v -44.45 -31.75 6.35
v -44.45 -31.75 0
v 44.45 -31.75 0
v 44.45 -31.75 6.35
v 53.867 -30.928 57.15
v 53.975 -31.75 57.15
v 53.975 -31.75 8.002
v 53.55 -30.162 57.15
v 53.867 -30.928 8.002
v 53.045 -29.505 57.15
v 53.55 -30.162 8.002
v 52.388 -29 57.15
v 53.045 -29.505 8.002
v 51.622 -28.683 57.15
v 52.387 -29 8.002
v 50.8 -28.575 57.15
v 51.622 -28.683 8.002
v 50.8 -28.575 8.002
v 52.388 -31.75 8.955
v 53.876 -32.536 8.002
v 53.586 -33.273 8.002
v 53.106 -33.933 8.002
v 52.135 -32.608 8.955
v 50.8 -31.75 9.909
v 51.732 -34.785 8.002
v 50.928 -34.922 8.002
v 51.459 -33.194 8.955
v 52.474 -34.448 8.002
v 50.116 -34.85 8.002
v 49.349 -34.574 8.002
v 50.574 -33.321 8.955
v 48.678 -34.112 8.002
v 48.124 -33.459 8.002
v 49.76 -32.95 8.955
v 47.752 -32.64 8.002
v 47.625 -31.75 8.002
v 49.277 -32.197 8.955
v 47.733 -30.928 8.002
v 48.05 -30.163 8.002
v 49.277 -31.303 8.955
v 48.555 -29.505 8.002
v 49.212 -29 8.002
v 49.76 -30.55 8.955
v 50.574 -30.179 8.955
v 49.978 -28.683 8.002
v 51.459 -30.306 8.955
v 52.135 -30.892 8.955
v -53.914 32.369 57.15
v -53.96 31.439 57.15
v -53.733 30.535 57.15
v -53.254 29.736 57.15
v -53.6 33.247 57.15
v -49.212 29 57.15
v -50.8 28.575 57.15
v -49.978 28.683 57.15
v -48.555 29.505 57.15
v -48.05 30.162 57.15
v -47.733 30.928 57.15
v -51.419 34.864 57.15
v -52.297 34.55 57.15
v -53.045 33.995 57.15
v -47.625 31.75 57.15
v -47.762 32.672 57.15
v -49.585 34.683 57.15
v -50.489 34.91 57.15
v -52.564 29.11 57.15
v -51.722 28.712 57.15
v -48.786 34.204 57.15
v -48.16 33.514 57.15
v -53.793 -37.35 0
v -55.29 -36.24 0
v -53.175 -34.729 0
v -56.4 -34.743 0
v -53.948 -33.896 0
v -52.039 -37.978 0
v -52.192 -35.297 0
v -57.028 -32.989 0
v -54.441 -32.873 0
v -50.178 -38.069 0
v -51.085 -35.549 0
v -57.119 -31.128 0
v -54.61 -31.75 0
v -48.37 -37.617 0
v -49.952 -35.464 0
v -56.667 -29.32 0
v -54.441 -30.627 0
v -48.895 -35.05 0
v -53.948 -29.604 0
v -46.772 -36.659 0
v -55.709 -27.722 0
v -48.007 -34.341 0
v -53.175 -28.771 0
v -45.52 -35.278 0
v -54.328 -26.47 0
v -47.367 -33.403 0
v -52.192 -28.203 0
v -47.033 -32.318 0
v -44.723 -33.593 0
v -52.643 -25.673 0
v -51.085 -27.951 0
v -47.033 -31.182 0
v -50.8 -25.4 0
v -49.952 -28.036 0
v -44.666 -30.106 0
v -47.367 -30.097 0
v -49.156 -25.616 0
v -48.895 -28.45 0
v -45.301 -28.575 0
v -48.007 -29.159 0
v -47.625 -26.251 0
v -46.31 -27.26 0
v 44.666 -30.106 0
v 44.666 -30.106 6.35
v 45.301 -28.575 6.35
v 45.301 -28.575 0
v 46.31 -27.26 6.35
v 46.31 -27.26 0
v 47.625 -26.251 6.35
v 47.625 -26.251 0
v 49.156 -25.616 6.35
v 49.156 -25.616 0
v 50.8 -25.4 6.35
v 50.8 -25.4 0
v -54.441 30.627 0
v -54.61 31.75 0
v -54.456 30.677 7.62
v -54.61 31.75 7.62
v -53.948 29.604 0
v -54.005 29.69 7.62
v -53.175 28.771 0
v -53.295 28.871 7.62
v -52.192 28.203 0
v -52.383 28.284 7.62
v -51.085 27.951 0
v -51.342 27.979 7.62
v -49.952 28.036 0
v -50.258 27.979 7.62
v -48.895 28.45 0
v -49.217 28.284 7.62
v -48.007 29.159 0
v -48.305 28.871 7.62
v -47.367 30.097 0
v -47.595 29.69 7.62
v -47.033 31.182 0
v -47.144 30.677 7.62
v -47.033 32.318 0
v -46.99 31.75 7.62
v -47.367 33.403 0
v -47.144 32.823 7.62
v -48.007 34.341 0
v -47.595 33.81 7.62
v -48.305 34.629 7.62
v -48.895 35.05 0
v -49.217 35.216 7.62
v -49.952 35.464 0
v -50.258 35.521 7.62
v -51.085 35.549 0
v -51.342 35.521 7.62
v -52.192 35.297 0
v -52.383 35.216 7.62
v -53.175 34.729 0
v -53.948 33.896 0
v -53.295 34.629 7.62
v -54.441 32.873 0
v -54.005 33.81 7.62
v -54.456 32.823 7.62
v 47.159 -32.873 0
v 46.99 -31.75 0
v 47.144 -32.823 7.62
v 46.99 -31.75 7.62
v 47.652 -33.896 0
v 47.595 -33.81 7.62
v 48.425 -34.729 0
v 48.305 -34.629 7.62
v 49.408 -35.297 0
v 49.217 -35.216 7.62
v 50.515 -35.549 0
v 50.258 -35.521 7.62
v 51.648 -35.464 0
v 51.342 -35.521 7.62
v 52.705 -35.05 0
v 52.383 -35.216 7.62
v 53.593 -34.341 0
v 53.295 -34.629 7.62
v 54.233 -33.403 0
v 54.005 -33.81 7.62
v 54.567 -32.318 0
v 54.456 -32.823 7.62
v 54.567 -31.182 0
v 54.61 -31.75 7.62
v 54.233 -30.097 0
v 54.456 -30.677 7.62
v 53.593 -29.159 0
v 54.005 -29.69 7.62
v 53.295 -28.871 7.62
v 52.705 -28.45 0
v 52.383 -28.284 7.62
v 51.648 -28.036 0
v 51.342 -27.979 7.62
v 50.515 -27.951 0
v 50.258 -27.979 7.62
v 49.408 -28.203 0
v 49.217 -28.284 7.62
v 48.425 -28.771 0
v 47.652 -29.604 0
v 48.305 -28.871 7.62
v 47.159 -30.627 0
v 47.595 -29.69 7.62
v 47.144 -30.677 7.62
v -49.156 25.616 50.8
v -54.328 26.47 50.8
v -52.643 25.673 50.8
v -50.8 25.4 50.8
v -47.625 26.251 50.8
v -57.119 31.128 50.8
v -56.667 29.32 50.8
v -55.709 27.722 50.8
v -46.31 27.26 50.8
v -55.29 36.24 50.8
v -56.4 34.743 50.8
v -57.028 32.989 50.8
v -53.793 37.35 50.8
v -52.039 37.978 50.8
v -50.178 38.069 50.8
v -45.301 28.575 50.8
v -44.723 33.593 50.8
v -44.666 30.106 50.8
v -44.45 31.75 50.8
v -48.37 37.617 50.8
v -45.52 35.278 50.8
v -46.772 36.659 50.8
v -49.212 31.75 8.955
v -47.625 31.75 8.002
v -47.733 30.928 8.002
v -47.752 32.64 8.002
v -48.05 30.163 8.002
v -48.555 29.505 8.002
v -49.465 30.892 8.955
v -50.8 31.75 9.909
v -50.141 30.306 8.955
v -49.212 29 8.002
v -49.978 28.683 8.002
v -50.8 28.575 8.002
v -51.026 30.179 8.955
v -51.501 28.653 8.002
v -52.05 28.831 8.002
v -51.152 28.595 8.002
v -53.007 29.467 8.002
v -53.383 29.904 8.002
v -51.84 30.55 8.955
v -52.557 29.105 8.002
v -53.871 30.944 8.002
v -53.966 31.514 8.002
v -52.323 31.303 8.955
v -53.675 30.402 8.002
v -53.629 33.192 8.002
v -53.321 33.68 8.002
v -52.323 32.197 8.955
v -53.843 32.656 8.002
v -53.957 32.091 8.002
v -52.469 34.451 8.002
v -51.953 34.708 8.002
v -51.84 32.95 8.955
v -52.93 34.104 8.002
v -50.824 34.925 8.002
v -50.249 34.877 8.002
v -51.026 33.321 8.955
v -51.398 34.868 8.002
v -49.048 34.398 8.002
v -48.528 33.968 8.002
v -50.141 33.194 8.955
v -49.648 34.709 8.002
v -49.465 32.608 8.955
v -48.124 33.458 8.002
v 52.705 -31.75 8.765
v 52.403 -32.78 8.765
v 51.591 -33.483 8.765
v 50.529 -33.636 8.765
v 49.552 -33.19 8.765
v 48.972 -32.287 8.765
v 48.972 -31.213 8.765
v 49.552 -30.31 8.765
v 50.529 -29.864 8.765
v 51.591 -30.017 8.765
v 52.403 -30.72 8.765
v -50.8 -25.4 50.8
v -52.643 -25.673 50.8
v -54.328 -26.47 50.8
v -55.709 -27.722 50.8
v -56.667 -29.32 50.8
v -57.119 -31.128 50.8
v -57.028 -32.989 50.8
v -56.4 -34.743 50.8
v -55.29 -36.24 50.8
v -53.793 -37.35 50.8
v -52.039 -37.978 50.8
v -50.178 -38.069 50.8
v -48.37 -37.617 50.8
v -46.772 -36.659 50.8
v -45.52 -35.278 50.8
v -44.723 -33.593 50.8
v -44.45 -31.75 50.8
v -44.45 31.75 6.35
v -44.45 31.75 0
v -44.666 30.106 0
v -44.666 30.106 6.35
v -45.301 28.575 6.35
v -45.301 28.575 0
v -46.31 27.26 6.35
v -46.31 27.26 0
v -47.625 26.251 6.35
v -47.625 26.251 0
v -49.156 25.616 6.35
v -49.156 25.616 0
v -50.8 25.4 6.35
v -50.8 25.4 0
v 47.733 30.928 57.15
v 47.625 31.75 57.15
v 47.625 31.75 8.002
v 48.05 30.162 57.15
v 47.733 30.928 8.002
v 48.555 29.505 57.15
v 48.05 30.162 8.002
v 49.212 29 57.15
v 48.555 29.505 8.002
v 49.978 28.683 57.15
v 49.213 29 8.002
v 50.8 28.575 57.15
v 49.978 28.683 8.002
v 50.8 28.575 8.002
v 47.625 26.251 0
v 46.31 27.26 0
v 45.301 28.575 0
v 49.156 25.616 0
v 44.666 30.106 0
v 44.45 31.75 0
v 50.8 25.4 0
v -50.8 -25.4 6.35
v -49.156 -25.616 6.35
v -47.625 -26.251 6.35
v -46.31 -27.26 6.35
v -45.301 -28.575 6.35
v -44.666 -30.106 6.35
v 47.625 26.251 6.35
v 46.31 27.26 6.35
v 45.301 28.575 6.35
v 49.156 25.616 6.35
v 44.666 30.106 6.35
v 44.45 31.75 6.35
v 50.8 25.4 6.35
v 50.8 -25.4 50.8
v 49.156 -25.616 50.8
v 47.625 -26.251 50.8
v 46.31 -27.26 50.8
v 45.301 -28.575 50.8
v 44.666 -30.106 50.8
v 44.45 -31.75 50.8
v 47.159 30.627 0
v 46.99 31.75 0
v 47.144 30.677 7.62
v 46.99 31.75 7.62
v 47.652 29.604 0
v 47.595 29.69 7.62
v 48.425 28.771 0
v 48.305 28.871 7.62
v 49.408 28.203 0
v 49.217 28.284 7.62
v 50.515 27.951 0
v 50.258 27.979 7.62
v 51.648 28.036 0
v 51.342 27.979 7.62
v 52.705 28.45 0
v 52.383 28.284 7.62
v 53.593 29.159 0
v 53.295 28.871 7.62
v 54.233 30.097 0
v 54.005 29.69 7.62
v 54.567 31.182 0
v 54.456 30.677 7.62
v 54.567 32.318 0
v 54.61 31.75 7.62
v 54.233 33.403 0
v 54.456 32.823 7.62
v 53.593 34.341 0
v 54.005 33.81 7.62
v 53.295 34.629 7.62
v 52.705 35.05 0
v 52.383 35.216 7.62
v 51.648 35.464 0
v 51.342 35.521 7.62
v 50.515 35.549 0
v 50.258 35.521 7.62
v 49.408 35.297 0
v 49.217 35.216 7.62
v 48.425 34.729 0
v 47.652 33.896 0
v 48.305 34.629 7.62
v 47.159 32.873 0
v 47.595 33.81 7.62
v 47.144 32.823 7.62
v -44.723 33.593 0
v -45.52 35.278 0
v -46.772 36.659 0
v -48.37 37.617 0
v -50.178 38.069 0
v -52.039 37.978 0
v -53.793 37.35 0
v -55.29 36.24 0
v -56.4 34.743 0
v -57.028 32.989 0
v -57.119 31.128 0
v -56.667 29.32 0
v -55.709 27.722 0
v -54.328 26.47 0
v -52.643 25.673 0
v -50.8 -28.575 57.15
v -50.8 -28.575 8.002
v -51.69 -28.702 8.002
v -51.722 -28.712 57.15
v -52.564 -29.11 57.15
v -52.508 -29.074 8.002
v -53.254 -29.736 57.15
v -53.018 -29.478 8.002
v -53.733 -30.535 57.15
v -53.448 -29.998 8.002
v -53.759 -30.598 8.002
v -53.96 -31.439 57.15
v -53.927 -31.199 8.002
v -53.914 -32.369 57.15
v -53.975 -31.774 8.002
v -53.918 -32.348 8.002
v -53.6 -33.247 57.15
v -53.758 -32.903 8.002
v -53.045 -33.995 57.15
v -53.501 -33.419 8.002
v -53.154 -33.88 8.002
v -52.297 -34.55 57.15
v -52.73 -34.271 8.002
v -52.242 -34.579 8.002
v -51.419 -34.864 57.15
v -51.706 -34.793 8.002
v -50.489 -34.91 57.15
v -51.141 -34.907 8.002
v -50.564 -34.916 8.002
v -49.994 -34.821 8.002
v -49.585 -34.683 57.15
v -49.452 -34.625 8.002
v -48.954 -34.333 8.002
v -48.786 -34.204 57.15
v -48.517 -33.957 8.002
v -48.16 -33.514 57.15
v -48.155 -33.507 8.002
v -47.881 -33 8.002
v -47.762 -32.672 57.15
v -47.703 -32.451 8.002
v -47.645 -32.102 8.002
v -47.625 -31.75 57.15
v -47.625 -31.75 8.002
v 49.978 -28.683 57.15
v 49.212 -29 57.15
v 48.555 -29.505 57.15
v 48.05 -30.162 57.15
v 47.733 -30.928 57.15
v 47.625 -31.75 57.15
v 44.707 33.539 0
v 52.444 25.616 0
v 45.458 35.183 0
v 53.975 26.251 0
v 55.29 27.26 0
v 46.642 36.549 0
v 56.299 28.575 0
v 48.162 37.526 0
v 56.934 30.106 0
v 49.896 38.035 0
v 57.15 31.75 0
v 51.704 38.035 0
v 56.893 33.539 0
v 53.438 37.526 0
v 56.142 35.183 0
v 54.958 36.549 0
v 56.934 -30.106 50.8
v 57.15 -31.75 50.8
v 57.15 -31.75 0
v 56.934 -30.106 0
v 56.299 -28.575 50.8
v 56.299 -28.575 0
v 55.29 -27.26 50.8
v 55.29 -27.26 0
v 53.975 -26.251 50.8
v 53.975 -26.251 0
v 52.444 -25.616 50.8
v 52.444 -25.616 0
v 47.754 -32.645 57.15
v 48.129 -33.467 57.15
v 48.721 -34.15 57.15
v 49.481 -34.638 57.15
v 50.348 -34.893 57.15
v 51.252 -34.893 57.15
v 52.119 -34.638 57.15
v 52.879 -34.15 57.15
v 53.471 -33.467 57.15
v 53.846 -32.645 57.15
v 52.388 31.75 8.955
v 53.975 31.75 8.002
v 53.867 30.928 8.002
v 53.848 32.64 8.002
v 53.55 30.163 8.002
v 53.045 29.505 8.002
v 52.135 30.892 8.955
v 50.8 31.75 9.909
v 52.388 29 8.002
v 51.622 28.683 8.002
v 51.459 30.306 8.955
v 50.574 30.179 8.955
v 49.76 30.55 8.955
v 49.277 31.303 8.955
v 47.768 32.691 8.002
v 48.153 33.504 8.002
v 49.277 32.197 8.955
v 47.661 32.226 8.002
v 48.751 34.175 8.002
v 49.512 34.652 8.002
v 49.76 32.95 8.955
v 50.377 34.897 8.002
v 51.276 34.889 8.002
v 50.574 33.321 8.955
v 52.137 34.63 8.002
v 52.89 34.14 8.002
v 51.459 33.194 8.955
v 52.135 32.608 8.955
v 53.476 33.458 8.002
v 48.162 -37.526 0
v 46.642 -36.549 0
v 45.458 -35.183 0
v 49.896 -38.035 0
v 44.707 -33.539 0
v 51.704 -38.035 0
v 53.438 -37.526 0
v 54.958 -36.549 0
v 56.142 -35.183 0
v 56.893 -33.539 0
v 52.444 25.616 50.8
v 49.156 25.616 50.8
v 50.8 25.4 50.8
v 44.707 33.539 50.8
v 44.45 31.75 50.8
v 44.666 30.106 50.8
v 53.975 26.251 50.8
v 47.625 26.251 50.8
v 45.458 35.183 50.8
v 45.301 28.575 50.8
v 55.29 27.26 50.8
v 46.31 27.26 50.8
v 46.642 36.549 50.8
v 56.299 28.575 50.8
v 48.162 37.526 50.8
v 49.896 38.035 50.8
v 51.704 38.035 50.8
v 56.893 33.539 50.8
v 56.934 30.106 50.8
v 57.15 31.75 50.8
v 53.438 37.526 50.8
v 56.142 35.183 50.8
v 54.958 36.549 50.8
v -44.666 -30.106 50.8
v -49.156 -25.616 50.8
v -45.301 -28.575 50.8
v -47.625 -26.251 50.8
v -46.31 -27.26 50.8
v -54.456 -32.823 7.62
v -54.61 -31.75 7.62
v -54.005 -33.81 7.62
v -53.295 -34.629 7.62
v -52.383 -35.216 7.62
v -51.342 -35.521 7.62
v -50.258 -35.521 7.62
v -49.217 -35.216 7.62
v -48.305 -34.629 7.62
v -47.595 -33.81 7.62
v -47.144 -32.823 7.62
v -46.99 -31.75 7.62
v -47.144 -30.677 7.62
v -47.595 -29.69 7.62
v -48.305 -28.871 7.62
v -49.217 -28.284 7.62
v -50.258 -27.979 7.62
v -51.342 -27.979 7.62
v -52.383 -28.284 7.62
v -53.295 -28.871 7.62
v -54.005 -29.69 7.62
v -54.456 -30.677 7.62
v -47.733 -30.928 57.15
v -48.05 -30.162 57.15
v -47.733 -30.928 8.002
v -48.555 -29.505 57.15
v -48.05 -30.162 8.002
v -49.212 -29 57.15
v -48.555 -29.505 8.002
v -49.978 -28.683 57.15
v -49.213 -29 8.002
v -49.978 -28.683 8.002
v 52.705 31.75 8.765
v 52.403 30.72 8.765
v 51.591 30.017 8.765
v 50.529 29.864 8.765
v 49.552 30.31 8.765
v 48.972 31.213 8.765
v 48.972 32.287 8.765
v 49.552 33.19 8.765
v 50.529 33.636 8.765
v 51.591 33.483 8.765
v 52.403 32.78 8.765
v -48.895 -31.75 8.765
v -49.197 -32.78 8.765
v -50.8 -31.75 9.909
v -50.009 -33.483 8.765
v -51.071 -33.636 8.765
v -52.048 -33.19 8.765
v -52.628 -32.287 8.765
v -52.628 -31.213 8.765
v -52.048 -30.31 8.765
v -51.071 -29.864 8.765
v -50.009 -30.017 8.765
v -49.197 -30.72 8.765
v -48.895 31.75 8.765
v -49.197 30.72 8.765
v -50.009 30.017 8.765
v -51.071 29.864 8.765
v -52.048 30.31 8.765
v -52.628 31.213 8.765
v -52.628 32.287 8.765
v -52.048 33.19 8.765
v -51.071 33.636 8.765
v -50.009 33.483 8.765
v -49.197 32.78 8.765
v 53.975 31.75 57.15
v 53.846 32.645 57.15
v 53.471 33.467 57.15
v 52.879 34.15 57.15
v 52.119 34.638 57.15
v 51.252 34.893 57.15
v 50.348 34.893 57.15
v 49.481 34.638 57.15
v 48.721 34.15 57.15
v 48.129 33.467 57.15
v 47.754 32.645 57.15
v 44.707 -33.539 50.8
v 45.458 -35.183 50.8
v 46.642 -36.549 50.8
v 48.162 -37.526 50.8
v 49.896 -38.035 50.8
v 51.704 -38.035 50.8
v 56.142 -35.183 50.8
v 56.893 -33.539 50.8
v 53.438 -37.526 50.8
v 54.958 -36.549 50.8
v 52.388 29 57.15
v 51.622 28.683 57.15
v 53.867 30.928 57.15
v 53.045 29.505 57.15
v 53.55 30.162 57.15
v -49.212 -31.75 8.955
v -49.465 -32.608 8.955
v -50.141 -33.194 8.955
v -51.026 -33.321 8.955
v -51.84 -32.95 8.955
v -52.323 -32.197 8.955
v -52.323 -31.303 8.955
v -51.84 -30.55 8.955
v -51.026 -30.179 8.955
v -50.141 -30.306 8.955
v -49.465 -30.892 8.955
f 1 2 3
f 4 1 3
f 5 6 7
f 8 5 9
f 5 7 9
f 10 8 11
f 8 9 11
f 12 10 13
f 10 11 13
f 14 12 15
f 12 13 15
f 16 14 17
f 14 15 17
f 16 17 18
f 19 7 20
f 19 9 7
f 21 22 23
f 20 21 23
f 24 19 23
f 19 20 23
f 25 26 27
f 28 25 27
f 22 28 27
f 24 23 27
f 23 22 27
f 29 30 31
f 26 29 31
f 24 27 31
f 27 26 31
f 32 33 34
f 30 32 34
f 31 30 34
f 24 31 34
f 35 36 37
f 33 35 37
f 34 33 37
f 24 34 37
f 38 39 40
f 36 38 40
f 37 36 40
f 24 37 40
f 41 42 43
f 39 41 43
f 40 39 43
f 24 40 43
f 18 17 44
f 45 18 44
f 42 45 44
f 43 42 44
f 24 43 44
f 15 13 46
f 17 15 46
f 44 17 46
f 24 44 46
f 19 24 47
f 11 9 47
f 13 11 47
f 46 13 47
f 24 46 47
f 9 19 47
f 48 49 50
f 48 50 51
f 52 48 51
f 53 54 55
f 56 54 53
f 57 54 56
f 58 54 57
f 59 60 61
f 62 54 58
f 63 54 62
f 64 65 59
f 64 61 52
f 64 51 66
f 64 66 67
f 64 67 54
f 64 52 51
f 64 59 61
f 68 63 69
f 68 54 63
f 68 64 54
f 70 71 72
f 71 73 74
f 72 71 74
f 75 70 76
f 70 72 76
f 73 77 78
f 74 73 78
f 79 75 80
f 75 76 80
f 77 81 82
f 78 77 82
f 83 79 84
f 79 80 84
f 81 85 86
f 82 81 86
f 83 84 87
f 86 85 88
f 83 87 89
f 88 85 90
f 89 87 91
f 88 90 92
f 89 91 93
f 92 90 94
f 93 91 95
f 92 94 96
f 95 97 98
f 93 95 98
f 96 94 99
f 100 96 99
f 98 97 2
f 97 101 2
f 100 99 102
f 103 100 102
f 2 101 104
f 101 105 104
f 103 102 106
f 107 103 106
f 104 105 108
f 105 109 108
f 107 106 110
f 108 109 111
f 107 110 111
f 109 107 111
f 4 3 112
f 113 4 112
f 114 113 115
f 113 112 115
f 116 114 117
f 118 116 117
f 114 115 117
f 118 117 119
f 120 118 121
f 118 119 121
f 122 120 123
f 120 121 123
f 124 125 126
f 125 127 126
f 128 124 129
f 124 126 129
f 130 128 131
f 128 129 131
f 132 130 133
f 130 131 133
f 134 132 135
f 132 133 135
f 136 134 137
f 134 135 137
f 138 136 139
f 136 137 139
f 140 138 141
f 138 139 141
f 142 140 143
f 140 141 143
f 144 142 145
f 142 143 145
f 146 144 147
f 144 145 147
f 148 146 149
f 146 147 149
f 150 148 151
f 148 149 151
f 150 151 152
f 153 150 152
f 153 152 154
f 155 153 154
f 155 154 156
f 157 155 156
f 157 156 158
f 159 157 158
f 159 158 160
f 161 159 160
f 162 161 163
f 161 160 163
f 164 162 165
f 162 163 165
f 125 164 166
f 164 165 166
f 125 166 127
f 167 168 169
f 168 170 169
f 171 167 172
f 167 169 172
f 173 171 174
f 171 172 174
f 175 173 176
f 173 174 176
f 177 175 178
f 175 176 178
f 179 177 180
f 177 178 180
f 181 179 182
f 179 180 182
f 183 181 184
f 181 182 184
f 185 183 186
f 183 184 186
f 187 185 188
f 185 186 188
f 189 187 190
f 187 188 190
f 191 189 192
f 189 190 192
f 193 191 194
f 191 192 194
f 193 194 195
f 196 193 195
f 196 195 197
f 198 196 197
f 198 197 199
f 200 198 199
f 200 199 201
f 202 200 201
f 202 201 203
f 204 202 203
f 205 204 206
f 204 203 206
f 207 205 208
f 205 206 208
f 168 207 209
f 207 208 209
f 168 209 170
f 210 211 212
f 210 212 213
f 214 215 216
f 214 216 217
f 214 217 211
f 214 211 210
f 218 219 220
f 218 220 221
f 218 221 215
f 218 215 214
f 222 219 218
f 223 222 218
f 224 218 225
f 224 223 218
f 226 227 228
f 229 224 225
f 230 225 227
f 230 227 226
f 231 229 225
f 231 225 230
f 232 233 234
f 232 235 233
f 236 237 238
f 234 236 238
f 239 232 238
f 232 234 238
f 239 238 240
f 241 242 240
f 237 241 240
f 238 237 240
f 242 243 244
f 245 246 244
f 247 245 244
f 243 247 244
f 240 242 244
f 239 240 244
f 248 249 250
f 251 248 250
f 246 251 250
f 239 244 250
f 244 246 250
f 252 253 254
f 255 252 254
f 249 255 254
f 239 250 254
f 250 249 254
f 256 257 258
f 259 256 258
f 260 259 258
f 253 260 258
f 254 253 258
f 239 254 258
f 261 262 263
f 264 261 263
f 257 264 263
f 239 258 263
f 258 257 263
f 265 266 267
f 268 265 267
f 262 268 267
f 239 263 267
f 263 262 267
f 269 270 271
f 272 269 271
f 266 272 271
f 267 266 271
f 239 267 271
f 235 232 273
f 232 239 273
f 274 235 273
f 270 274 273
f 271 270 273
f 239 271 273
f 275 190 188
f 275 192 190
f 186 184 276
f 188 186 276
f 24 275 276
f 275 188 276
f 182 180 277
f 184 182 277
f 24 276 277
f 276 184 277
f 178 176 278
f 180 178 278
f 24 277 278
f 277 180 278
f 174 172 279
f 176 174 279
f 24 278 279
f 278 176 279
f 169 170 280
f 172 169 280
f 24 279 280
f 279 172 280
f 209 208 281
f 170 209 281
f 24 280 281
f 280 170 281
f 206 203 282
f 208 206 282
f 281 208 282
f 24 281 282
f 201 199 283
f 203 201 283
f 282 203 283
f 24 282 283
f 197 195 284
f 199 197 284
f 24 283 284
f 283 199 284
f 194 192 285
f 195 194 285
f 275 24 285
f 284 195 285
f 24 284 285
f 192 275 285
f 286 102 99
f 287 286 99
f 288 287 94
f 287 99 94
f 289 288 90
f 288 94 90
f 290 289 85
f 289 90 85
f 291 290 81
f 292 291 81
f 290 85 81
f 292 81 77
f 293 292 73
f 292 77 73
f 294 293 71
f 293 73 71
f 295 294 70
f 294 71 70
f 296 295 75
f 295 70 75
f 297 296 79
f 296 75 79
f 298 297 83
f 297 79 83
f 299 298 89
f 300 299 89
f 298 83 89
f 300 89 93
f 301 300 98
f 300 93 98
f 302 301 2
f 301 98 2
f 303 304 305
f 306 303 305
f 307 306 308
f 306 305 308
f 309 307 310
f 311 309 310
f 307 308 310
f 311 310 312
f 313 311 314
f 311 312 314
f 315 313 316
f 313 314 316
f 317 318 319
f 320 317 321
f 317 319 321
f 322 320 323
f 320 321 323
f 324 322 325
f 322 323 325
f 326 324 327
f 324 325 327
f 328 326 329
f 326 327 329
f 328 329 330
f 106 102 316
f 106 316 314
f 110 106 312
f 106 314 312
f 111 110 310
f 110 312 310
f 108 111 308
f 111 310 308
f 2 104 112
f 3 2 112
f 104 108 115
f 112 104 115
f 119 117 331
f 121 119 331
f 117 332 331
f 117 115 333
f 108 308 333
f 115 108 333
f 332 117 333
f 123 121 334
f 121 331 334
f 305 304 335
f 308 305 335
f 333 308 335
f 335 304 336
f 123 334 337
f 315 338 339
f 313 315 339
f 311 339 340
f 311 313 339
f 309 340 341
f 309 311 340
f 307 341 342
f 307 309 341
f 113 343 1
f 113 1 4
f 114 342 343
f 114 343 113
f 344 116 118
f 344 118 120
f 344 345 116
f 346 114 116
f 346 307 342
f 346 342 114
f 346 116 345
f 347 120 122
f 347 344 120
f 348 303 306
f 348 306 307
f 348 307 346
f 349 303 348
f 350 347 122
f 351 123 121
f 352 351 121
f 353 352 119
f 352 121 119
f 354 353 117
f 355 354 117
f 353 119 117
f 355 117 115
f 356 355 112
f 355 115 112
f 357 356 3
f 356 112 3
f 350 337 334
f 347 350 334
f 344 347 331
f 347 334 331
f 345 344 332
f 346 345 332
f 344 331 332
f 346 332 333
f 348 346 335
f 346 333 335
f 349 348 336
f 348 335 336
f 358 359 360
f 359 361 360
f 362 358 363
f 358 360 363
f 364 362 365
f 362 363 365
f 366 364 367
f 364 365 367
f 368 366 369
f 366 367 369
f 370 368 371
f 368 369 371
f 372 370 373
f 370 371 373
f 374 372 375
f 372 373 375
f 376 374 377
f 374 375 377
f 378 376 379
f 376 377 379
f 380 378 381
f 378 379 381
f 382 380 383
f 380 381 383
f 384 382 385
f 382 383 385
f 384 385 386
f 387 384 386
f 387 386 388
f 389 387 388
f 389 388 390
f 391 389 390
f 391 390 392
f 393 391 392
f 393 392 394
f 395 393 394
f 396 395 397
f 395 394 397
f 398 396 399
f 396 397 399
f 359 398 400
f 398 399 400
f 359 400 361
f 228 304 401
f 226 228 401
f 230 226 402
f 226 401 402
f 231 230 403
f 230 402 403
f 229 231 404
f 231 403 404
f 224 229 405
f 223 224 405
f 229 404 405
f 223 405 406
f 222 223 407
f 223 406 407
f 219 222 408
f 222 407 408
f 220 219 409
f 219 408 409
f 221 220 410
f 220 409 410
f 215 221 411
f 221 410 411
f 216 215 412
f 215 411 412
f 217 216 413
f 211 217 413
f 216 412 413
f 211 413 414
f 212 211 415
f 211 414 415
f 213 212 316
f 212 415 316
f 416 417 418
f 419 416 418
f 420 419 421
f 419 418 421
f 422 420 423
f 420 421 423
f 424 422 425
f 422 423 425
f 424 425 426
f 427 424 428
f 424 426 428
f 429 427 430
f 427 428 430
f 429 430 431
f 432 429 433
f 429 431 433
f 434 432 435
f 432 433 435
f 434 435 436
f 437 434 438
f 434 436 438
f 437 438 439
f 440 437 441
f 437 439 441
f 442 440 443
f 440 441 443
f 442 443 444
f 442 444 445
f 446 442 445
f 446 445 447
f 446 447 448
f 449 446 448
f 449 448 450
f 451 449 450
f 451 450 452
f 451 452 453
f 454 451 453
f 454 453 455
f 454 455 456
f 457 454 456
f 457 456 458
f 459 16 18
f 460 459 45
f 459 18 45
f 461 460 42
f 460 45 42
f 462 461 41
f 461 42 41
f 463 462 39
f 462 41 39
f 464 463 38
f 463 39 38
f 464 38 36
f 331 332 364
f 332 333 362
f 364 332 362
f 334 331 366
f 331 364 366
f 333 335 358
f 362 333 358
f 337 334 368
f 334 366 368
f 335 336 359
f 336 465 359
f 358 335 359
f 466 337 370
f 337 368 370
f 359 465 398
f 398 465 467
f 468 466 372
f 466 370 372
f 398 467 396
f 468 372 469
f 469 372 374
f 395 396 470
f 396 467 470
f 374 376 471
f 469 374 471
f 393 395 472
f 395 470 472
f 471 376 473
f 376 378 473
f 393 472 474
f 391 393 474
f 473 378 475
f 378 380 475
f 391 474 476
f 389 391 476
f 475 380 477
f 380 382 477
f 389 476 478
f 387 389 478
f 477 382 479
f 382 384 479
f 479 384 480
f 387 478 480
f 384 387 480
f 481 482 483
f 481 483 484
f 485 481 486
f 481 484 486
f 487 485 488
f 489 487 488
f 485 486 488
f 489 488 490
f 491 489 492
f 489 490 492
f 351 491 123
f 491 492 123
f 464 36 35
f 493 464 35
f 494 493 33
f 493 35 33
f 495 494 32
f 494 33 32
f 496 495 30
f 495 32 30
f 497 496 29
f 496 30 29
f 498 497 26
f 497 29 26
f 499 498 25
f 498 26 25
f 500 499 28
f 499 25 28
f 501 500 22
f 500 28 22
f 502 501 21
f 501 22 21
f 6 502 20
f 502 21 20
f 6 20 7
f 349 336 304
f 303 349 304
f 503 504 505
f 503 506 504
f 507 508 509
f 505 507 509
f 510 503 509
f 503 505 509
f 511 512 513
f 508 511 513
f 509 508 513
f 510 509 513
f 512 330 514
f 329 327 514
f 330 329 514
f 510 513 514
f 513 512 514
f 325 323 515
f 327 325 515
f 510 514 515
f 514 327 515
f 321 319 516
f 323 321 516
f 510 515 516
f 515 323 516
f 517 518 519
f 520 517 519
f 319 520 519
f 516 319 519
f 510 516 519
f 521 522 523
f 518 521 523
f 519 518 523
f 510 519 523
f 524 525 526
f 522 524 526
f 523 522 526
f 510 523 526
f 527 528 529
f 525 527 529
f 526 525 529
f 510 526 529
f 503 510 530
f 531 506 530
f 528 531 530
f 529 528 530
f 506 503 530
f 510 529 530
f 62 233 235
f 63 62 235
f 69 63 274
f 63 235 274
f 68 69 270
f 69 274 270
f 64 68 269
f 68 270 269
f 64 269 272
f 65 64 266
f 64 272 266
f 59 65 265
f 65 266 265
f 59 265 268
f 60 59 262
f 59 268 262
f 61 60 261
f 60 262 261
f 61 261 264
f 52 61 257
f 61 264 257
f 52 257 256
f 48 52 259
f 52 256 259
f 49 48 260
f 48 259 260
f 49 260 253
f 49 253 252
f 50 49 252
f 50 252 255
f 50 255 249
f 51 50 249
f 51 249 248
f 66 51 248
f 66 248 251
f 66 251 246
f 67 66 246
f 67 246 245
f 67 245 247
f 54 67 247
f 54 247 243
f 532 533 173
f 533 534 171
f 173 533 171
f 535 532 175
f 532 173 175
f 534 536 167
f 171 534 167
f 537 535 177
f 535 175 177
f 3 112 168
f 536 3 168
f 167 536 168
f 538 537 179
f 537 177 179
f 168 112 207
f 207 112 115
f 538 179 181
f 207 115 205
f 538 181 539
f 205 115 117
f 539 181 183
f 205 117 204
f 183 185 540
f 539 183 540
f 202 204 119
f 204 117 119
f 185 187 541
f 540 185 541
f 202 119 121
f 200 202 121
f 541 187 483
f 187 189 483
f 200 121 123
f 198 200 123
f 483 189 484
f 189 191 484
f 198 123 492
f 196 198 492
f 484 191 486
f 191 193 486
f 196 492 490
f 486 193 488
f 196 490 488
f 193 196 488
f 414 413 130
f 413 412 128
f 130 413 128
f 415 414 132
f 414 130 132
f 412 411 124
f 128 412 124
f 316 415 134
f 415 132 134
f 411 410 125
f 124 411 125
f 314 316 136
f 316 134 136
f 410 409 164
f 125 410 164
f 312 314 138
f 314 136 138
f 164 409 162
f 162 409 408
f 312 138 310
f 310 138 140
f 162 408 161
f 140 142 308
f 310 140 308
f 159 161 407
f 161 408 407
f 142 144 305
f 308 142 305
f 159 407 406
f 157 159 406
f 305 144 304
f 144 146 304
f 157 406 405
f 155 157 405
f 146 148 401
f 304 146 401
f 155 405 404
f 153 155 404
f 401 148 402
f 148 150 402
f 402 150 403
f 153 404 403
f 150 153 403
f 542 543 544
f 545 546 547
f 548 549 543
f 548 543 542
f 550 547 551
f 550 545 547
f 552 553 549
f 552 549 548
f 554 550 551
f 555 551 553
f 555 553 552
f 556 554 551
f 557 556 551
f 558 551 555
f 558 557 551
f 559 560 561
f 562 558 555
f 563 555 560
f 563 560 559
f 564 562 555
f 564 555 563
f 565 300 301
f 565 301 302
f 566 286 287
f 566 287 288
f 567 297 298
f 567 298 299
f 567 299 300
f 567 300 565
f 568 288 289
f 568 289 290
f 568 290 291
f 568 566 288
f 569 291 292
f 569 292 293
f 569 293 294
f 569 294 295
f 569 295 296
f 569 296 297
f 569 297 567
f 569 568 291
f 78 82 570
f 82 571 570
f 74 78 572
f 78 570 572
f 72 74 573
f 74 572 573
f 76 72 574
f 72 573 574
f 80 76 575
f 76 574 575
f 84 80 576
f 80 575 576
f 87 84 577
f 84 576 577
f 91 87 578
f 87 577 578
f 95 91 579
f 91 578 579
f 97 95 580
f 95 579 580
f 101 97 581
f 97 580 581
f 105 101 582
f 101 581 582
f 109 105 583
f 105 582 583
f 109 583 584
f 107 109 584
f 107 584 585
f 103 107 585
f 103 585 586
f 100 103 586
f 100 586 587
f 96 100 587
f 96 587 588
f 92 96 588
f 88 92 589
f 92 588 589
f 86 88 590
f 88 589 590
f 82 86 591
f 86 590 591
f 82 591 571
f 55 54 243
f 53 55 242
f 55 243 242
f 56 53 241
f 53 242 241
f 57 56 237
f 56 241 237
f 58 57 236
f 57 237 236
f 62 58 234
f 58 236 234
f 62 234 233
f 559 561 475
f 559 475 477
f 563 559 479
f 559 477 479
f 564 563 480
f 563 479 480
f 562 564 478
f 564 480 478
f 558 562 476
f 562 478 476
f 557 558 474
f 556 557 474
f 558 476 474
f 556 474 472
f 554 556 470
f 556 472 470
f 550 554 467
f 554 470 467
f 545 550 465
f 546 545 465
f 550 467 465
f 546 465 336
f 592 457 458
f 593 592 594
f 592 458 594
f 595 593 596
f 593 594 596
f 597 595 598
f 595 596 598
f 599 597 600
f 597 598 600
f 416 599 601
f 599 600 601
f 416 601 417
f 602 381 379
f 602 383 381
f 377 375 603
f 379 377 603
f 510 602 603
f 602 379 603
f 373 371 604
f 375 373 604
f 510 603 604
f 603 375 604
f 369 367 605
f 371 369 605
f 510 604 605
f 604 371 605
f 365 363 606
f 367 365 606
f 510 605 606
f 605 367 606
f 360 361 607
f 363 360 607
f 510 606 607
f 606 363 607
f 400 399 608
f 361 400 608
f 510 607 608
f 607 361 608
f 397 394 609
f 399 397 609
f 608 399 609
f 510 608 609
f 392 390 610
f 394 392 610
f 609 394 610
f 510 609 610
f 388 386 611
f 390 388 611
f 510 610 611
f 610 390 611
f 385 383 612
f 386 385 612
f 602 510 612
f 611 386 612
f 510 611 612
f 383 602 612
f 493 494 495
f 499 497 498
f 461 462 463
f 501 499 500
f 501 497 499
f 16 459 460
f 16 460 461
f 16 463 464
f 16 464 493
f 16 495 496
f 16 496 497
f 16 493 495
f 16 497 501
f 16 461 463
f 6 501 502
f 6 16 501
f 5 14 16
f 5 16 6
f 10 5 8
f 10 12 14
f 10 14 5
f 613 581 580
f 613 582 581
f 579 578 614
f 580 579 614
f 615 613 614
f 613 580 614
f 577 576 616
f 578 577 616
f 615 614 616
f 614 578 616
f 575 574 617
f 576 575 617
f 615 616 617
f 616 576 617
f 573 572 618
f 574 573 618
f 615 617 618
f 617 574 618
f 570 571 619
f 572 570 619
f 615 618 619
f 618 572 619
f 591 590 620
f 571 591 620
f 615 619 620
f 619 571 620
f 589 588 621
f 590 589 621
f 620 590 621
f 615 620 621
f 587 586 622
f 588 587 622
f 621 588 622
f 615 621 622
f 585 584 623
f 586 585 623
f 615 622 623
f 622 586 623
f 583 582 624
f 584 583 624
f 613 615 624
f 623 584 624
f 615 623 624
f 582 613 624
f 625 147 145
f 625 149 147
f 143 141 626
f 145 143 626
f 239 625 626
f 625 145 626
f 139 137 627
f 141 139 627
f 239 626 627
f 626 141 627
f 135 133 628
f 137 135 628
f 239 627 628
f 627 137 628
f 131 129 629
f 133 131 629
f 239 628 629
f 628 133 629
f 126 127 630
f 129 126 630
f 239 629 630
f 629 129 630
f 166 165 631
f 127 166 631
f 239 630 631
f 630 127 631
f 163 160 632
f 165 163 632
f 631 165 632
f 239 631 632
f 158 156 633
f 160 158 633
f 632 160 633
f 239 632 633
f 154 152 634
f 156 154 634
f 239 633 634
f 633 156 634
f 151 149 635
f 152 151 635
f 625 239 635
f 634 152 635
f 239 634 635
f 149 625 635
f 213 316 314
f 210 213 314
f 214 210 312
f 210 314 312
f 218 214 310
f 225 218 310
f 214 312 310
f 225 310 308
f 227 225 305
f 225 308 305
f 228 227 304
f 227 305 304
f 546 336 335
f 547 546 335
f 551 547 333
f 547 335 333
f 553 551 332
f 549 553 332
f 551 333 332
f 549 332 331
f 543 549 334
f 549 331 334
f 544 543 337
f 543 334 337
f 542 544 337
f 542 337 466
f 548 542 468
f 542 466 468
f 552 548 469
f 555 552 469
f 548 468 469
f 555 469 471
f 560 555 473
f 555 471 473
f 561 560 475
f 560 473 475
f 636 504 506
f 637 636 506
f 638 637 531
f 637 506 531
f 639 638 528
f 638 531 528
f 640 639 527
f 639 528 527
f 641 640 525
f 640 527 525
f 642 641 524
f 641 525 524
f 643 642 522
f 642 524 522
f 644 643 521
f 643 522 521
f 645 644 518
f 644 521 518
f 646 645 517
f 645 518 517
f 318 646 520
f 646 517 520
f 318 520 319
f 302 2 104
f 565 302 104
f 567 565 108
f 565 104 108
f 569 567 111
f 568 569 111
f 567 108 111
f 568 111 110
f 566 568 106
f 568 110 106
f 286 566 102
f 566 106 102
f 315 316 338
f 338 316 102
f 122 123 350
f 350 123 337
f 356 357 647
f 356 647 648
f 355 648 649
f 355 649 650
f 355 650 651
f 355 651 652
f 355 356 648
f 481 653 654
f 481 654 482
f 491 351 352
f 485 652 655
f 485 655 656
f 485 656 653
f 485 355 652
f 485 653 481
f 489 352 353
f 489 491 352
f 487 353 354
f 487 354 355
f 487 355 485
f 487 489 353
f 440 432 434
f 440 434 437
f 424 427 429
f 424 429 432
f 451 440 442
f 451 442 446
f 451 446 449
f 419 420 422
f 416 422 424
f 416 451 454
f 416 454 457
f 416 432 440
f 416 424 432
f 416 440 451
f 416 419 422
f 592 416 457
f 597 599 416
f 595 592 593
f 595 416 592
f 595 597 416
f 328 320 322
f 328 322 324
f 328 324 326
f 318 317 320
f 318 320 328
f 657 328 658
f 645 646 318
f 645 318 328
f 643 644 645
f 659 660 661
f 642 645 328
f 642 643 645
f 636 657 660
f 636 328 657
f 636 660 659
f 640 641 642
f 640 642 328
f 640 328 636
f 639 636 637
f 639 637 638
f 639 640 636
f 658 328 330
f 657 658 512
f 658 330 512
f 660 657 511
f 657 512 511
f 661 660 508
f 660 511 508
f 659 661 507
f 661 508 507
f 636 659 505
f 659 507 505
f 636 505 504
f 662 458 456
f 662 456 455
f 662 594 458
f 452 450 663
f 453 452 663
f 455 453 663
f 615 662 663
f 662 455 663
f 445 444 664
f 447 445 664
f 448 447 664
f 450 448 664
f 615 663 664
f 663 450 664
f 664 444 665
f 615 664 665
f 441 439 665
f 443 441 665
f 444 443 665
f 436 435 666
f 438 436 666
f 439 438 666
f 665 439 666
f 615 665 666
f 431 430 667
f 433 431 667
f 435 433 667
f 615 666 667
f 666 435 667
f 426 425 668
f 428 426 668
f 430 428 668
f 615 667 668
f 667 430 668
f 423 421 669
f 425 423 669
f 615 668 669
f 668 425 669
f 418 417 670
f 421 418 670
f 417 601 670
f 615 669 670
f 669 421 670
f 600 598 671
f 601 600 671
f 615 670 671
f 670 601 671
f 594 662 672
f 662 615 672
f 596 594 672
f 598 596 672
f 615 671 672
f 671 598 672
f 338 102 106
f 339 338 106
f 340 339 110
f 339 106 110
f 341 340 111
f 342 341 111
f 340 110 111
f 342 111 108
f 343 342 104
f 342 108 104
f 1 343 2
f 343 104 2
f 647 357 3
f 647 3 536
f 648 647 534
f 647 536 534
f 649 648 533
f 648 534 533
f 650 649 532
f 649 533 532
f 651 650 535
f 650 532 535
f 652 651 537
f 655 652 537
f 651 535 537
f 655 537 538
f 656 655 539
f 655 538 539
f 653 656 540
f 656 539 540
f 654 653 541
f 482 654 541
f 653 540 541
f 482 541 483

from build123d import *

# Parameters (mm, degrees)
F1_DEPTH   = 50.8
F2_DEPTH   = 6.35
F3_DEPTH   = 57.15
F4_D       = 7.62
F4_DEPTH   = 7.62
F4_TIP     = 2.2892789585
F4_2_D     = 7.62
F4_2_DEPTH = 7.62
F4_2_TIP   = 2.2892789585
F4_3_D     = 7.62
F4_3_DEPTH = 7.62
F4_3_TIP   = 2.2892789585
F4_4_D     = 7.62
F4_4_DEPTH = 7.62
F4_4_TIP   = 2.2892789585
F4_5_D     = 7.62
F4_5_DEPTH = 7.62
F4_5_TIP   = 2.2892789585
F4_6_D     = 7.62
F4_6_DEPTH = 7.62
F4_6_TIP   = 2.2892789585
F4_7_D     = 7.62
F4_7_DEPTH = 7.62
F4_7_TIP   = 2.2892789585
F4_8_D     = 7.62
F4_8_DEPTH = 7.62
F4_8_TIP   = 2.2892789585


with BuildPart() as f1:
    # F0 (on Top) → F1 (new body)
    with BuildSketch(Plane.XY):
        with BuildLine():
            Line((-47.625, 31.75), (-44.45, 31.75))
            ThreePointArc((-44.45, 31.75), (-55.2901280605, 36.2401280605), (-50.8, 25.4))
            Line((-50.8, 25.4), (-50.8, 28.575))
            ThreePointArc((-50.8, 28.575), (-53.0450640303, 33.9950640303), (-47.625, 31.75))
        make_face()
        with BuildLine():
            Line((-50.8, 31.75), (-47.625, 31.75))
            ThreePointArc((-47.625, 31.75), (-53.0450640303, 33.9950640303), (-50.8, 28.575))
            Line((-50.8, 28.575), (-50.8, 31.75))
        make_face()
        with BuildLine():
            ThreePointArc((-50.8, 28.575), (-48.5549359697, 29.5049359697), (-47.625, 31.75))
            Line((-47.625, 31.75), (-50.8, 31.75))
            Line((-50.8, 31.75), (-50.8, 28.575))
        make_face()
        with BuildLine():
            ThreePointArc((-50.8, 25.4), (-46.3098719395, 27.2598719395), (-44.45, 31.75))
            Line((-44.45, 31.75), (-47.625, 31.75))
            ThreePointArc((-47.625, 31.75), (-48.5549359697, 29.5049359697), (-50.8, 28.575))
            Line((-50.8, 28.575), (-50.8, 25.4))
        make_face()
    extrude(amount=F1_DEPTH)

    # F4
    with Locations(Plane(origin=(0, 0, 0), x_dir=(1, 0, 0), z_dir=(0, 0, -1))):
        with Locations((-50.8, 31.75), (-50.8, -31.75), (50.8, -31.75), (50.8, 31.75)):
            Hole(F4_D / 2, depth=F4_DEPTH)
            with Locations((0, 0, -(F4_DEPTH + F4_TIP / 2))):  # 118° drill point
                Cone(0, F4_D / 2, F4_TIP, mode=Mode.SUBTRACT)


with BuildPart() as f1b:
    # F0 (on Top) → F1, piece 2 (new body)
    with BuildSketch(Plane.XY):
        with BuildLine():
            Line((47.625, 31.75), (44.45, 31.75))
            ThreePointArc((44.45, 31.75), (46.3098719395, 27.2598719395), (50.8, 25.4))
            Line((50.8, 25.4), (50.8, 28.575))
            ThreePointArc((50.8, 28.575), (48.5549359697, 29.5049359697), (47.625, 31.75))
        make_face()
        with BuildLine():
            Line((50.8, 31.75), (47.625, 31.75))
            ThreePointArc((47.625, 31.75), (48.5549359697, 29.5049359697), (50.8, 28.575))
            Line((50.8, 28.575), (50.8, 31.75))
        make_face()
        with BuildLine():
            ThreePointArc((57.15, 31.75), (50.8, 38.1), (44.45, 31.75))
            Line((44.45, 31.75), (47.625, 31.75))
            ThreePointArc((47.625, 31.75), (50.8, 34.925), (53.975, 31.75))
            ThreePointArc((53.975, 31.75), (53.0450640303, 29.5049359697), (50.8, 28.575))
            Line((50.8, 28.575), (50.8, 25.4))
            ThreePointArc((50.8, 25.4), (55.2901280605, 27.2598719395), (57.15, 31.75))
        make_face()
        with BuildLine():
            ThreePointArc((53.975, 31.75), (50.8, 34.925), (47.625, 31.75))
            Line((47.625, 31.75), (50.8, 31.75))
            Line((50.8, 31.75), (50.8, 28.575))
            ThreePointArc((50.8, 28.575), (53.0450640303, 29.5049359697), (53.975, 31.75))
        make_face()
    extrude(amount=F1_DEPTH)

    # F4#2
    with Locations(Plane(origin=(0, 0, 0), x_dir=(1, 0, 0), z_dir=(0, 0, -1))):
        with Locations((-50.8, 31.75), (-50.8, -31.75), (50.8, -31.75), (50.8, 31.75)):
            Hole(F4_2_D / 2, depth=F4_2_DEPTH)
            with Locations((0, 0, -(F4_2_DEPTH + F4_2_TIP / 2))):  # 118° drill point
                Cone(0, F4_2_D / 2, F4_2_TIP, mode=Mode.SUBTRACT)


with BuildPart() as f1c:
    # F0 (on Top) → F1, piece 3 (new body)
    with BuildSketch(Plane.XY):
        with BuildLine():
            Line((50.8, -28.575), (50.8, -25.4))
            ThreePointArc((50.8, -25.4), (46.3098719395, -27.2598719395), (44.45, -31.75))
            Line((44.45, -31.75), (47.625, -31.75))
            ThreePointArc((47.625, -31.75), (48.5549359697, -29.5049359697), (50.8, -28.575))
        make_face()
        with BuildLine():
            ThreePointArc((57.15, -31.75), (55.2901280605, -27.2598719395), (50.8, -25.4))
            Line((50.8, -25.4), (50.8, -28.575))
            ThreePointArc((50.8, -28.575), (53.0450640303, -29.5049359697), (53.975, -31.75))
            ThreePointArc((53.975, -31.75), (50.8, -34.925), (47.625, -31.75))
            Line((47.625, -31.75), (44.45, -31.75))
            ThreePointArc((44.45, -31.75), (50.8, -38.1), (57.15, -31.75))
        make_face()
        with BuildLine():
            ThreePointArc((53.975, -31.75), (53.0450640303, -29.5049359697), (50.8, -28.575))
            Line((50.8, -28.575), (50.8, -31.75))
            Line((50.8, -31.75), (47.625, -31.75))
            ThreePointArc((47.625, -31.75), (50.8, -34.925), (53.975, -31.75))
        make_face()
        with BuildLine():
            Line((50.8, -31.75), (50.8, -28.575))
            ThreePointArc((50.8, -28.575), (48.5549359697, -29.5049359697), (47.625, -31.75))
            Line((47.625, -31.75), (50.8, -31.75))
        make_face()
    extrude(amount=F1_DEPTH)

    # F4#3
    with Locations(Plane(origin=(0, 0, 0), x_dir=(1, 0, 0), z_dir=(0, 0, -1))):
        with Locations((-50.8, 31.75), (-50.8, -31.75), (50.8, -31.75), (50.8, 31.75)):
            Hole(F4_3_D / 2, depth=F4_3_DEPTH)
            with Locations((0, 0, -(F4_3_DEPTH + F4_3_TIP / 2))):  # 118° drill point
                Cone(0, F4_3_D / 2, F4_3_TIP, mode=Mode.SUBTRACT)


with BuildPart() as f1d:
    # F0 (on Top) → F1, piece 4 (new body)
    with BuildSketch(Plane.XY):
        with BuildLine():
            Line((-50.8, -28.575), (-50.8, -25.4))
            ThreePointArc((-50.8, -25.4), (-55.2901280605, -36.2401280605), (-44.45, -31.75))
            Line((-44.45, -31.75), (-47.625, -31.75))
            ThreePointArc((-47.625, -31.75), (-53.0450640303, -33.9950640303), (-50.8, -28.575))
        make_face()
        with BuildLine():
            Line((-50.8, -31.75), (-50.8, -28.575))
            ThreePointArc((-50.8, -28.575), (-53.0450640303, -33.9950640303), (-47.625, -31.75))
            Line((-47.625, -31.75), (-50.8, -31.75))
        make_face()
        with BuildLine():
            ThreePointArc((-47.625, -31.75), (-48.5549359697, -29.5049359697), (-50.8, -28.575))
            Line((-50.8, -28.575), (-50.8, -31.75))
            Line((-50.8, -31.75), (-47.625, -31.75))
        make_face()
        with BuildLine():
            ThreePointArc((-44.45, -31.75), (-46.3098719395, -27.2598719395), (-50.8, -25.4))
            Line((-50.8, -25.4), (-50.8, -28.575))
            ThreePointArc((-50.8, -28.575), (-48.5549359697, -29.5049359697), (-47.625, -31.75))
            Line((-47.625, -31.75), (-44.45, -31.75))
        make_face()
    extrude(amount=F1_DEPTH)

    # F4#4
    with Locations(Plane(origin=(0, 0, 0), x_dir=(1, 0, 0), z_dir=(0, 0, -1))):
        with Locations((-50.8, 31.75), (-50.8, -31.75), (50.8, -31.75), (50.8, 31.75)):
            Hole(F4_4_D / 2, depth=F4_4_DEPTH)
            with Locations((0, 0, -(F4_4_DEPTH + F4_4_TIP / 2))):  # 118° drill point
                Cone(0, F4_4_D / 2, F4_4_TIP, mode=Mode.SUBTRACT)


with BuildPart() as f2:
    # F0 (on Top) → F2 (new body)
    with BuildSketch(Plane.XY):
        with BuildLine():
            Line((44.45, 31.75), (-44.45, 31.75))
            ThreePointArc((-44.45, 31.75), (-46.3098719395, 27.2598719395), (-50.8, 25.4))
            Line((-50.8, 25.4), (-50.8, -25.4))
            ThreePointArc((-50.8, -25.4), (-46.3098719395, -27.2598719395), (-44.45, -31.75))
            Line((-44.45, -31.75), (44.45, -31.75))
            ThreePointArc((44.45, -31.75), (46.3098719395, -27.2598719395), (50.8, -25.4))
            Line((50.8, -25.4), (50.8, 25.4))
            ThreePointArc((50.8, 25.4), (46.3098719395, 27.2598719395), (44.45, 31.75))
        make_face()
    extrude(amount=F2_DEPTH)


with BuildPart() as f3:
    # F0 (on Top) → F3 (new body)
    with BuildSketch(Plane.XY):
        with BuildLine():
            Line((-50.8, -31.75), (-50.8, -28.575))
            ThreePointArc((-50.8, -28.575), (-53.0450640303, -33.9950640303), (-47.625, -31.75))
            Line((-47.625, -31.75), (-50.8, -31.75))
        make_face()
        with BuildLine():
            ThreePointArc((-47.625, -31.75), (-48.5549359697, -29.5049359697), (-50.8, -28.575))
            Line((-50.8, -28.575), (-50.8, -31.75))
            Line((-50.8, -31.75), (-47.625, -31.75))
        make_face()
    extrude(amount=F3_DEPTH)

    # F4#5
    with Locations(Plane(origin=(0, 0, 0), x_dir=(1, 0, 0), z_dir=(0, 0, -1))):
        with Locations((-50.8, 31.75), (-50.8, -31.75), (50.8, -31.75), (50.8, 31.75)):
            Hole(F4_5_D / 2, depth=F4_5_DEPTH)
            with Locations((0, 0, -(F4_5_DEPTH + F4_5_TIP / 2))):  # 118° drill point
                Cone(0, F4_5_D / 2, F4_5_TIP, mode=Mode.SUBTRACT)


with BuildPart() as f3b:
    # F0 (on Top) → F3, piece 2 (new body)
    with BuildSketch(Plane.XY):
        with BuildLine():
            Line((-50.8, 31.75), (-47.625, 31.75))
            ThreePointArc((-47.625, 31.75), (-53.0450640303, 33.9950640303), (-50.8, 28.575))
            Line((-50.8, 28.575), (-50.8, 31.75))
        make_face()
        with BuildLine():
            ThreePointArc((-50.8, 28.575), (-48.5549359697, 29.5049359697), (-47.625, 31.75))
            Line((-47.625, 31.75), (-50.8, 31.75))
            Line((-50.8, 31.75), (-50.8, 28.575))
        make_face()
    extrude(amount=F3_DEPTH)

    # F4#6
    with Locations(Plane(origin=(0, 0, 0), x_dir=(1, 0, 0), z_dir=(0, 0, -1))):
        with Locations((-50.8, 31.75), (-50.8, -31.75), (50.8, -31.75), (50.8, 31.75)):
            Hole(F4_6_D / 2, depth=F4_6_DEPTH)
            with Locations((0, 0, -(F4_6_DEPTH + F4_6_TIP / 2))):  # 118° drill point
                Cone(0, F4_6_D / 2, F4_6_TIP, mode=Mode.SUBTRACT)


with BuildPart() as f3c:
    # F0 (on Top) → F3, piece 3 (new body)
    with BuildSketch(Plane.XY):
        with BuildLine():
            ThreePointArc((53.975, 31.75), (50.8, 34.925), (47.625, 31.75))
            Line((47.625, 31.75), (50.8, 31.75))
            Line((50.8, 31.75), (50.8, 28.575))
            ThreePointArc((50.8, 28.575), (53.0450640303, 29.5049359697), (53.975, 31.75))
        make_face()
        with BuildLine():
            Line((50.8, 31.75), (47.625, 31.75))
            ThreePointArc((47.625, 31.75), (48.5549359697, 29.5049359697), (50.8, 28.575))
            Line((50.8, 28.575), (50.8, 31.75))
        make_face()
    extrude(amount=F3_DEPTH)

    # F4#7
    with Locations(Plane(origin=(0, 0, 0), x_dir=(1, 0, 0), z_dir=(0, 0, -1))):
        with Locations((-50.8, 31.75), (-50.8, -31.75), (50.8, -31.75), (50.8, 31.75)):
            Hole(F4_7_D / 2, depth=F4_7_DEPTH)
            with Locations((0, 0, -(F4_7_DEPTH + F4_7_TIP / 2))):  # 118° drill point
                Cone(0, F4_7_D / 2, F4_7_TIP, mode=Mode.SUBTRACT)


with BuildPart() as f3d:
    # F0 (on Top) → F3, piece 4 (new body)
    with BuildSketch(Plane.XY):
        with BuildLine():
            ThreePointArc((53.975, -31.75), (53.0450640303, -29.5049359697), (50.8, -28.575))
            Line((50.8, -28.575), (50.8, -31.75))
            Line((50.8, -31.75), (47.625, -31.75))
            ThreePointArc((47.625, -31.75), (50.8, -34.925), (53.975, -31.75))
        make_face()
        with BuildLine():
            Line((50.8, -31.75), (50.8, -28.575))
            ThreePointArc((50.8, -28.575), (48.5549359697, -29.5049359697), (47.625, -31.75))
            Line((47.625, -31.75), (50.8, -31.75))
        make_face()
    extrude(amount=F3_DEPTH)

    # F4#8
    with Locations(Plane(origin=(0, 0, 0), x_dir=(1, 0, 0), z_dir=(0, 0, -1))):
        with Locations((-50.8, 31.75), (-50.8, -31.75), (50.8, -31.75), (50.8, 31.75)):
            Hole(F4_8_D / 2, depth=F4_8_DEPTH)
            with Locations((0, 0, -(F4_8_DEPTH + F4_8_TIP / 2))):  # 118° drill point
                Cone(0, F4_8_D / 2, F4_8_TIP, mode=Mode.SUBTRACT)


solid = Compound([f1.part, f1b.part, f1c.part, f1d.part, f2.part, f3.part, f3b.part, f3c.part, f3d.part])
